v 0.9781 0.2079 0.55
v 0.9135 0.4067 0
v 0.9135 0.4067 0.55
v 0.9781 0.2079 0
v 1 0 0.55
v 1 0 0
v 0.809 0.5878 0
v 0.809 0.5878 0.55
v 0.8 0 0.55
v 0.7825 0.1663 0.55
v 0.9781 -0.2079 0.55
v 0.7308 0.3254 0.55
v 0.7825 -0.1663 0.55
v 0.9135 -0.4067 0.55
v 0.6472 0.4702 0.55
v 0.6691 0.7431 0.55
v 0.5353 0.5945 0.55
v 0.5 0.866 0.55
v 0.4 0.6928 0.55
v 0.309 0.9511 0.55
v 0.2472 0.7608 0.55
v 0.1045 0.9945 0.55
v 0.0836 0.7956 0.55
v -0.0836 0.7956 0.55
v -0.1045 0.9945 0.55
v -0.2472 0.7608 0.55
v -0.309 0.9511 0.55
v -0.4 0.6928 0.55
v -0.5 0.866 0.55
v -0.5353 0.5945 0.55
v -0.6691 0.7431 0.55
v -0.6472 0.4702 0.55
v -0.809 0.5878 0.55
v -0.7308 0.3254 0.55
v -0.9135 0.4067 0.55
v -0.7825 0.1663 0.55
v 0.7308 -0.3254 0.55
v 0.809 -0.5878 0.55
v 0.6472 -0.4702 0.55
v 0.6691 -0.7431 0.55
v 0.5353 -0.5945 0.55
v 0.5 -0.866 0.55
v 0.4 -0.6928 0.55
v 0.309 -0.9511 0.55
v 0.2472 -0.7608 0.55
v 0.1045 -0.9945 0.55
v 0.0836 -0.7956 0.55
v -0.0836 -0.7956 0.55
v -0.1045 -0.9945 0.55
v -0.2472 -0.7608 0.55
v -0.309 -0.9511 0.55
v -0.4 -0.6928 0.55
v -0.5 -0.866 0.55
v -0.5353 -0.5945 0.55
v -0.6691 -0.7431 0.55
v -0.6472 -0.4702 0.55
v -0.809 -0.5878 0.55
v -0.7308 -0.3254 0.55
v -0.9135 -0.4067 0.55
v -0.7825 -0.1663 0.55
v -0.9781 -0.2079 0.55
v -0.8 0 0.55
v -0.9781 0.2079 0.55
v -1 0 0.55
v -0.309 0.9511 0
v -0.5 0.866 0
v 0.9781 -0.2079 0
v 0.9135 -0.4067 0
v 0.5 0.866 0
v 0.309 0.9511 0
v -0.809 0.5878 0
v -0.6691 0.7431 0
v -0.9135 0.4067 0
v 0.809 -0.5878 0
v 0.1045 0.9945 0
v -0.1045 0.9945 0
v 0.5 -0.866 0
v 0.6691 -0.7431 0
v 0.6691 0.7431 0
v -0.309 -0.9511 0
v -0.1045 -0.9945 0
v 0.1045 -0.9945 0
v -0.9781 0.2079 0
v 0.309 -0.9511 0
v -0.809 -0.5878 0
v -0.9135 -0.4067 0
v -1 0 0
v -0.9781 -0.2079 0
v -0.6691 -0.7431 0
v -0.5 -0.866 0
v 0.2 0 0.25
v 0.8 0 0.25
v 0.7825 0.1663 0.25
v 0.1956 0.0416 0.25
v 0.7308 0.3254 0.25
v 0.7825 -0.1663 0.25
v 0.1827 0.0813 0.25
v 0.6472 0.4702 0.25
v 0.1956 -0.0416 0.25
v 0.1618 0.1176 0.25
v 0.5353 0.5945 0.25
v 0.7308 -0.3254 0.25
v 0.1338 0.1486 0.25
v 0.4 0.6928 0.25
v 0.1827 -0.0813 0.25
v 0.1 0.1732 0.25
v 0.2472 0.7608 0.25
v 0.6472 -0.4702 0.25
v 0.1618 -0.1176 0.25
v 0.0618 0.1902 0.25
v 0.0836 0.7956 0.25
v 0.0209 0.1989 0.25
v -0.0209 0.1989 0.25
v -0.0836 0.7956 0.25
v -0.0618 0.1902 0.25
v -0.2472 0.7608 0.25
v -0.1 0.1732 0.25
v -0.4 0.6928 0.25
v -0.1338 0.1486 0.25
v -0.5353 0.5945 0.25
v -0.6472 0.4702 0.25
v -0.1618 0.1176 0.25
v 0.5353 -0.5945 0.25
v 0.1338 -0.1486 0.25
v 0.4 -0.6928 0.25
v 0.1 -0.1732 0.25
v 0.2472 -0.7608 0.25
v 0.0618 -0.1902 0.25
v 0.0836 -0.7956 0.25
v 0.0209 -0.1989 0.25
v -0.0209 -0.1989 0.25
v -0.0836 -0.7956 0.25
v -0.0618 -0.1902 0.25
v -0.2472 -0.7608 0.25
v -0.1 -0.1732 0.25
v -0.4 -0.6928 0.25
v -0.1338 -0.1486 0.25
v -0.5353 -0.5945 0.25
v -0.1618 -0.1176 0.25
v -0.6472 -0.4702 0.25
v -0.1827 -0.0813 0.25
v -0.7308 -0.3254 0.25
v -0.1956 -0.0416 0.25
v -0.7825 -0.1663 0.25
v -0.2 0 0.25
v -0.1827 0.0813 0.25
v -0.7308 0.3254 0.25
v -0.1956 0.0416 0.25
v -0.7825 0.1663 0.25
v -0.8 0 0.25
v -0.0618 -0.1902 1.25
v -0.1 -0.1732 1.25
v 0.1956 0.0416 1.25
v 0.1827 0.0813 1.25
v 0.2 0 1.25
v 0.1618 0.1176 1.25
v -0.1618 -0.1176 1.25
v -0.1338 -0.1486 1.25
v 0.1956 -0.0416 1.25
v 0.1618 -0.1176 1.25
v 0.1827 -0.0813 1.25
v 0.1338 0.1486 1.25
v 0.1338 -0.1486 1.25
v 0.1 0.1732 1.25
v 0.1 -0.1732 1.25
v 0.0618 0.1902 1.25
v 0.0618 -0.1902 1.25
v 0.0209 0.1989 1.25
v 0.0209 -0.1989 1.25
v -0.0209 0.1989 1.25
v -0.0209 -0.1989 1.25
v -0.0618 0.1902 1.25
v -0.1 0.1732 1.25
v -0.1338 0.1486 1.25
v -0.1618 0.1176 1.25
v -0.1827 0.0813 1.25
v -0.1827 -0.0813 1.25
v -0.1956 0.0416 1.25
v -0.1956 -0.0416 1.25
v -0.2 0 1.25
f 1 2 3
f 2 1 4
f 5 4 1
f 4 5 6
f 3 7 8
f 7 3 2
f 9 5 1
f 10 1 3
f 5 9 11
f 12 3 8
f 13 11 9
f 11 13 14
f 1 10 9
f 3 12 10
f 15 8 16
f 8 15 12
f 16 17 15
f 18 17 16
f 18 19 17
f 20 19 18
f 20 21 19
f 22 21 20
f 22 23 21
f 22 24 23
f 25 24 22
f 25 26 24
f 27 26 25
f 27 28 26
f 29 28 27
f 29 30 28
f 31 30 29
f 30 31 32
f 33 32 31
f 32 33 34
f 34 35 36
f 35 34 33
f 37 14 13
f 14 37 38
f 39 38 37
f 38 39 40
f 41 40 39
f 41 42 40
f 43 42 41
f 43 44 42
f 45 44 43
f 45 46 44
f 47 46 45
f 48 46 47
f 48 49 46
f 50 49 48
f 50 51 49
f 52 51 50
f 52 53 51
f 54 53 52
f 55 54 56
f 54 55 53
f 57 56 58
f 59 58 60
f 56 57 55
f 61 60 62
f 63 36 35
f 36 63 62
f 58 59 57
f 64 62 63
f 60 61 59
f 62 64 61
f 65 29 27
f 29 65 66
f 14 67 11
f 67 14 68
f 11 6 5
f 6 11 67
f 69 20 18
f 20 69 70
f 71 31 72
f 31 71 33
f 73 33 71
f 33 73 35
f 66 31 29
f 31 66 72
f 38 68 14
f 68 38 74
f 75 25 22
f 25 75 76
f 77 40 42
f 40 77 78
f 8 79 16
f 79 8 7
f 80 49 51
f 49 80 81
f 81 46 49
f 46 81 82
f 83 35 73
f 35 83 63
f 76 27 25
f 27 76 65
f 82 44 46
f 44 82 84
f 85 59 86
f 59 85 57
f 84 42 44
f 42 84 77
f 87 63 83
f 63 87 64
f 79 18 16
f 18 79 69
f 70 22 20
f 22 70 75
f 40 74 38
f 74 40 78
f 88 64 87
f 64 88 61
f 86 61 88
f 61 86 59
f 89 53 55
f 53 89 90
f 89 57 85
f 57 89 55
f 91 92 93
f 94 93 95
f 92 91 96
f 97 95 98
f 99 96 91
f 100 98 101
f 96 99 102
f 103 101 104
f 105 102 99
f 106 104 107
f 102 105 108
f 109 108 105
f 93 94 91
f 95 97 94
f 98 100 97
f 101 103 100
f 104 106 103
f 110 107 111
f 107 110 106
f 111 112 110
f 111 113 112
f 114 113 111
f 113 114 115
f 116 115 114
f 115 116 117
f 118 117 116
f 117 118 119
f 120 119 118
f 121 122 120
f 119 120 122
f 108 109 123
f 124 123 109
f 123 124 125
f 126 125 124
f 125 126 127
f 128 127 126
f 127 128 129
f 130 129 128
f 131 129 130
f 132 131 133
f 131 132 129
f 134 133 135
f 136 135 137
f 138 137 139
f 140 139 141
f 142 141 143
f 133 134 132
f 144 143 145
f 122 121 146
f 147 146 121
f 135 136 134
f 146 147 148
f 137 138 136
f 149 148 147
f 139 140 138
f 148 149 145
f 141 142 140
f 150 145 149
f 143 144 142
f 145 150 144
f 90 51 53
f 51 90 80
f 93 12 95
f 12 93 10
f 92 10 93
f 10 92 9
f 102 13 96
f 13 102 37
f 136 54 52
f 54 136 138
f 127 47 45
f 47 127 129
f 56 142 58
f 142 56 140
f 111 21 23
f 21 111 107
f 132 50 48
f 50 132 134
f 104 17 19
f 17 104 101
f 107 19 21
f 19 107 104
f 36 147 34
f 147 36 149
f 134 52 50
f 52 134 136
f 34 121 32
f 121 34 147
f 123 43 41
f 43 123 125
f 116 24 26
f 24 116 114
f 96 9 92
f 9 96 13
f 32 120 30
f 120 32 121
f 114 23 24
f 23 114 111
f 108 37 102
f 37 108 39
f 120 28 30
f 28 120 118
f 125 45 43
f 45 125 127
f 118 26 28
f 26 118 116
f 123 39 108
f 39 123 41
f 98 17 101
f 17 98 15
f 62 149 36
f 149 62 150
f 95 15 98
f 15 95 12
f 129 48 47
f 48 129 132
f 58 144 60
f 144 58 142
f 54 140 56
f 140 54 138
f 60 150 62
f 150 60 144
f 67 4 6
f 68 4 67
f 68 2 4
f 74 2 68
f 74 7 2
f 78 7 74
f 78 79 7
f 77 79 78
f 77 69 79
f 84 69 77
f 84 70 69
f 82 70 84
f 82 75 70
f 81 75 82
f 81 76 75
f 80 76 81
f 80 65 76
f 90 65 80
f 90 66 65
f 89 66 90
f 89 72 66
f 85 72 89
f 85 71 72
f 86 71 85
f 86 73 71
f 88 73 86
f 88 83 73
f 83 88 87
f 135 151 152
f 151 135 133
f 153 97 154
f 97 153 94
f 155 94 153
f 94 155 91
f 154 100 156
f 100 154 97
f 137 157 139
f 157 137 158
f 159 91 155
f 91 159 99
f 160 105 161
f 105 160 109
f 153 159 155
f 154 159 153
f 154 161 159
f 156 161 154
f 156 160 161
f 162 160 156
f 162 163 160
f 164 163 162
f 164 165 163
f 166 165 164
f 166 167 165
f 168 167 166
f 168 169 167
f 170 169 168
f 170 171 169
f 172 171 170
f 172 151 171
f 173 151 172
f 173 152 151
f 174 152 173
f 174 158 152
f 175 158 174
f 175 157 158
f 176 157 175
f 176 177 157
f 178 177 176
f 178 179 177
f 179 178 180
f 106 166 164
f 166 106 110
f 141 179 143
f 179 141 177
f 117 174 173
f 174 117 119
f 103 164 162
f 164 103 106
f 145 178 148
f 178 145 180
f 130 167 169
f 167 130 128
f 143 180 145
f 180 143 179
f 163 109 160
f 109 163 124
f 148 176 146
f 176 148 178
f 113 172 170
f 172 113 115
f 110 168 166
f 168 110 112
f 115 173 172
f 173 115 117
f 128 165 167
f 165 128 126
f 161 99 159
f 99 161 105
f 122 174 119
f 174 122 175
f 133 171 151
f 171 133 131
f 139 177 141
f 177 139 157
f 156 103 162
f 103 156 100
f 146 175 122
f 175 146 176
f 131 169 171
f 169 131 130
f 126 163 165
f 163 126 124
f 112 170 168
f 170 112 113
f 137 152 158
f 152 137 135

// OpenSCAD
$fn=30;

lower_height = 0.25;
cylinder(lower_height, 1, 1);

translate([0,0,lower_height])
cylinder(1, 0.2, 0.2);

translate([0, 0, lower_height])
difference() {
  cylinder(0.3, 1, 1);
  translate([0, 0, -1])
    cylinder(3, 0.8, 0.8);
}
;
